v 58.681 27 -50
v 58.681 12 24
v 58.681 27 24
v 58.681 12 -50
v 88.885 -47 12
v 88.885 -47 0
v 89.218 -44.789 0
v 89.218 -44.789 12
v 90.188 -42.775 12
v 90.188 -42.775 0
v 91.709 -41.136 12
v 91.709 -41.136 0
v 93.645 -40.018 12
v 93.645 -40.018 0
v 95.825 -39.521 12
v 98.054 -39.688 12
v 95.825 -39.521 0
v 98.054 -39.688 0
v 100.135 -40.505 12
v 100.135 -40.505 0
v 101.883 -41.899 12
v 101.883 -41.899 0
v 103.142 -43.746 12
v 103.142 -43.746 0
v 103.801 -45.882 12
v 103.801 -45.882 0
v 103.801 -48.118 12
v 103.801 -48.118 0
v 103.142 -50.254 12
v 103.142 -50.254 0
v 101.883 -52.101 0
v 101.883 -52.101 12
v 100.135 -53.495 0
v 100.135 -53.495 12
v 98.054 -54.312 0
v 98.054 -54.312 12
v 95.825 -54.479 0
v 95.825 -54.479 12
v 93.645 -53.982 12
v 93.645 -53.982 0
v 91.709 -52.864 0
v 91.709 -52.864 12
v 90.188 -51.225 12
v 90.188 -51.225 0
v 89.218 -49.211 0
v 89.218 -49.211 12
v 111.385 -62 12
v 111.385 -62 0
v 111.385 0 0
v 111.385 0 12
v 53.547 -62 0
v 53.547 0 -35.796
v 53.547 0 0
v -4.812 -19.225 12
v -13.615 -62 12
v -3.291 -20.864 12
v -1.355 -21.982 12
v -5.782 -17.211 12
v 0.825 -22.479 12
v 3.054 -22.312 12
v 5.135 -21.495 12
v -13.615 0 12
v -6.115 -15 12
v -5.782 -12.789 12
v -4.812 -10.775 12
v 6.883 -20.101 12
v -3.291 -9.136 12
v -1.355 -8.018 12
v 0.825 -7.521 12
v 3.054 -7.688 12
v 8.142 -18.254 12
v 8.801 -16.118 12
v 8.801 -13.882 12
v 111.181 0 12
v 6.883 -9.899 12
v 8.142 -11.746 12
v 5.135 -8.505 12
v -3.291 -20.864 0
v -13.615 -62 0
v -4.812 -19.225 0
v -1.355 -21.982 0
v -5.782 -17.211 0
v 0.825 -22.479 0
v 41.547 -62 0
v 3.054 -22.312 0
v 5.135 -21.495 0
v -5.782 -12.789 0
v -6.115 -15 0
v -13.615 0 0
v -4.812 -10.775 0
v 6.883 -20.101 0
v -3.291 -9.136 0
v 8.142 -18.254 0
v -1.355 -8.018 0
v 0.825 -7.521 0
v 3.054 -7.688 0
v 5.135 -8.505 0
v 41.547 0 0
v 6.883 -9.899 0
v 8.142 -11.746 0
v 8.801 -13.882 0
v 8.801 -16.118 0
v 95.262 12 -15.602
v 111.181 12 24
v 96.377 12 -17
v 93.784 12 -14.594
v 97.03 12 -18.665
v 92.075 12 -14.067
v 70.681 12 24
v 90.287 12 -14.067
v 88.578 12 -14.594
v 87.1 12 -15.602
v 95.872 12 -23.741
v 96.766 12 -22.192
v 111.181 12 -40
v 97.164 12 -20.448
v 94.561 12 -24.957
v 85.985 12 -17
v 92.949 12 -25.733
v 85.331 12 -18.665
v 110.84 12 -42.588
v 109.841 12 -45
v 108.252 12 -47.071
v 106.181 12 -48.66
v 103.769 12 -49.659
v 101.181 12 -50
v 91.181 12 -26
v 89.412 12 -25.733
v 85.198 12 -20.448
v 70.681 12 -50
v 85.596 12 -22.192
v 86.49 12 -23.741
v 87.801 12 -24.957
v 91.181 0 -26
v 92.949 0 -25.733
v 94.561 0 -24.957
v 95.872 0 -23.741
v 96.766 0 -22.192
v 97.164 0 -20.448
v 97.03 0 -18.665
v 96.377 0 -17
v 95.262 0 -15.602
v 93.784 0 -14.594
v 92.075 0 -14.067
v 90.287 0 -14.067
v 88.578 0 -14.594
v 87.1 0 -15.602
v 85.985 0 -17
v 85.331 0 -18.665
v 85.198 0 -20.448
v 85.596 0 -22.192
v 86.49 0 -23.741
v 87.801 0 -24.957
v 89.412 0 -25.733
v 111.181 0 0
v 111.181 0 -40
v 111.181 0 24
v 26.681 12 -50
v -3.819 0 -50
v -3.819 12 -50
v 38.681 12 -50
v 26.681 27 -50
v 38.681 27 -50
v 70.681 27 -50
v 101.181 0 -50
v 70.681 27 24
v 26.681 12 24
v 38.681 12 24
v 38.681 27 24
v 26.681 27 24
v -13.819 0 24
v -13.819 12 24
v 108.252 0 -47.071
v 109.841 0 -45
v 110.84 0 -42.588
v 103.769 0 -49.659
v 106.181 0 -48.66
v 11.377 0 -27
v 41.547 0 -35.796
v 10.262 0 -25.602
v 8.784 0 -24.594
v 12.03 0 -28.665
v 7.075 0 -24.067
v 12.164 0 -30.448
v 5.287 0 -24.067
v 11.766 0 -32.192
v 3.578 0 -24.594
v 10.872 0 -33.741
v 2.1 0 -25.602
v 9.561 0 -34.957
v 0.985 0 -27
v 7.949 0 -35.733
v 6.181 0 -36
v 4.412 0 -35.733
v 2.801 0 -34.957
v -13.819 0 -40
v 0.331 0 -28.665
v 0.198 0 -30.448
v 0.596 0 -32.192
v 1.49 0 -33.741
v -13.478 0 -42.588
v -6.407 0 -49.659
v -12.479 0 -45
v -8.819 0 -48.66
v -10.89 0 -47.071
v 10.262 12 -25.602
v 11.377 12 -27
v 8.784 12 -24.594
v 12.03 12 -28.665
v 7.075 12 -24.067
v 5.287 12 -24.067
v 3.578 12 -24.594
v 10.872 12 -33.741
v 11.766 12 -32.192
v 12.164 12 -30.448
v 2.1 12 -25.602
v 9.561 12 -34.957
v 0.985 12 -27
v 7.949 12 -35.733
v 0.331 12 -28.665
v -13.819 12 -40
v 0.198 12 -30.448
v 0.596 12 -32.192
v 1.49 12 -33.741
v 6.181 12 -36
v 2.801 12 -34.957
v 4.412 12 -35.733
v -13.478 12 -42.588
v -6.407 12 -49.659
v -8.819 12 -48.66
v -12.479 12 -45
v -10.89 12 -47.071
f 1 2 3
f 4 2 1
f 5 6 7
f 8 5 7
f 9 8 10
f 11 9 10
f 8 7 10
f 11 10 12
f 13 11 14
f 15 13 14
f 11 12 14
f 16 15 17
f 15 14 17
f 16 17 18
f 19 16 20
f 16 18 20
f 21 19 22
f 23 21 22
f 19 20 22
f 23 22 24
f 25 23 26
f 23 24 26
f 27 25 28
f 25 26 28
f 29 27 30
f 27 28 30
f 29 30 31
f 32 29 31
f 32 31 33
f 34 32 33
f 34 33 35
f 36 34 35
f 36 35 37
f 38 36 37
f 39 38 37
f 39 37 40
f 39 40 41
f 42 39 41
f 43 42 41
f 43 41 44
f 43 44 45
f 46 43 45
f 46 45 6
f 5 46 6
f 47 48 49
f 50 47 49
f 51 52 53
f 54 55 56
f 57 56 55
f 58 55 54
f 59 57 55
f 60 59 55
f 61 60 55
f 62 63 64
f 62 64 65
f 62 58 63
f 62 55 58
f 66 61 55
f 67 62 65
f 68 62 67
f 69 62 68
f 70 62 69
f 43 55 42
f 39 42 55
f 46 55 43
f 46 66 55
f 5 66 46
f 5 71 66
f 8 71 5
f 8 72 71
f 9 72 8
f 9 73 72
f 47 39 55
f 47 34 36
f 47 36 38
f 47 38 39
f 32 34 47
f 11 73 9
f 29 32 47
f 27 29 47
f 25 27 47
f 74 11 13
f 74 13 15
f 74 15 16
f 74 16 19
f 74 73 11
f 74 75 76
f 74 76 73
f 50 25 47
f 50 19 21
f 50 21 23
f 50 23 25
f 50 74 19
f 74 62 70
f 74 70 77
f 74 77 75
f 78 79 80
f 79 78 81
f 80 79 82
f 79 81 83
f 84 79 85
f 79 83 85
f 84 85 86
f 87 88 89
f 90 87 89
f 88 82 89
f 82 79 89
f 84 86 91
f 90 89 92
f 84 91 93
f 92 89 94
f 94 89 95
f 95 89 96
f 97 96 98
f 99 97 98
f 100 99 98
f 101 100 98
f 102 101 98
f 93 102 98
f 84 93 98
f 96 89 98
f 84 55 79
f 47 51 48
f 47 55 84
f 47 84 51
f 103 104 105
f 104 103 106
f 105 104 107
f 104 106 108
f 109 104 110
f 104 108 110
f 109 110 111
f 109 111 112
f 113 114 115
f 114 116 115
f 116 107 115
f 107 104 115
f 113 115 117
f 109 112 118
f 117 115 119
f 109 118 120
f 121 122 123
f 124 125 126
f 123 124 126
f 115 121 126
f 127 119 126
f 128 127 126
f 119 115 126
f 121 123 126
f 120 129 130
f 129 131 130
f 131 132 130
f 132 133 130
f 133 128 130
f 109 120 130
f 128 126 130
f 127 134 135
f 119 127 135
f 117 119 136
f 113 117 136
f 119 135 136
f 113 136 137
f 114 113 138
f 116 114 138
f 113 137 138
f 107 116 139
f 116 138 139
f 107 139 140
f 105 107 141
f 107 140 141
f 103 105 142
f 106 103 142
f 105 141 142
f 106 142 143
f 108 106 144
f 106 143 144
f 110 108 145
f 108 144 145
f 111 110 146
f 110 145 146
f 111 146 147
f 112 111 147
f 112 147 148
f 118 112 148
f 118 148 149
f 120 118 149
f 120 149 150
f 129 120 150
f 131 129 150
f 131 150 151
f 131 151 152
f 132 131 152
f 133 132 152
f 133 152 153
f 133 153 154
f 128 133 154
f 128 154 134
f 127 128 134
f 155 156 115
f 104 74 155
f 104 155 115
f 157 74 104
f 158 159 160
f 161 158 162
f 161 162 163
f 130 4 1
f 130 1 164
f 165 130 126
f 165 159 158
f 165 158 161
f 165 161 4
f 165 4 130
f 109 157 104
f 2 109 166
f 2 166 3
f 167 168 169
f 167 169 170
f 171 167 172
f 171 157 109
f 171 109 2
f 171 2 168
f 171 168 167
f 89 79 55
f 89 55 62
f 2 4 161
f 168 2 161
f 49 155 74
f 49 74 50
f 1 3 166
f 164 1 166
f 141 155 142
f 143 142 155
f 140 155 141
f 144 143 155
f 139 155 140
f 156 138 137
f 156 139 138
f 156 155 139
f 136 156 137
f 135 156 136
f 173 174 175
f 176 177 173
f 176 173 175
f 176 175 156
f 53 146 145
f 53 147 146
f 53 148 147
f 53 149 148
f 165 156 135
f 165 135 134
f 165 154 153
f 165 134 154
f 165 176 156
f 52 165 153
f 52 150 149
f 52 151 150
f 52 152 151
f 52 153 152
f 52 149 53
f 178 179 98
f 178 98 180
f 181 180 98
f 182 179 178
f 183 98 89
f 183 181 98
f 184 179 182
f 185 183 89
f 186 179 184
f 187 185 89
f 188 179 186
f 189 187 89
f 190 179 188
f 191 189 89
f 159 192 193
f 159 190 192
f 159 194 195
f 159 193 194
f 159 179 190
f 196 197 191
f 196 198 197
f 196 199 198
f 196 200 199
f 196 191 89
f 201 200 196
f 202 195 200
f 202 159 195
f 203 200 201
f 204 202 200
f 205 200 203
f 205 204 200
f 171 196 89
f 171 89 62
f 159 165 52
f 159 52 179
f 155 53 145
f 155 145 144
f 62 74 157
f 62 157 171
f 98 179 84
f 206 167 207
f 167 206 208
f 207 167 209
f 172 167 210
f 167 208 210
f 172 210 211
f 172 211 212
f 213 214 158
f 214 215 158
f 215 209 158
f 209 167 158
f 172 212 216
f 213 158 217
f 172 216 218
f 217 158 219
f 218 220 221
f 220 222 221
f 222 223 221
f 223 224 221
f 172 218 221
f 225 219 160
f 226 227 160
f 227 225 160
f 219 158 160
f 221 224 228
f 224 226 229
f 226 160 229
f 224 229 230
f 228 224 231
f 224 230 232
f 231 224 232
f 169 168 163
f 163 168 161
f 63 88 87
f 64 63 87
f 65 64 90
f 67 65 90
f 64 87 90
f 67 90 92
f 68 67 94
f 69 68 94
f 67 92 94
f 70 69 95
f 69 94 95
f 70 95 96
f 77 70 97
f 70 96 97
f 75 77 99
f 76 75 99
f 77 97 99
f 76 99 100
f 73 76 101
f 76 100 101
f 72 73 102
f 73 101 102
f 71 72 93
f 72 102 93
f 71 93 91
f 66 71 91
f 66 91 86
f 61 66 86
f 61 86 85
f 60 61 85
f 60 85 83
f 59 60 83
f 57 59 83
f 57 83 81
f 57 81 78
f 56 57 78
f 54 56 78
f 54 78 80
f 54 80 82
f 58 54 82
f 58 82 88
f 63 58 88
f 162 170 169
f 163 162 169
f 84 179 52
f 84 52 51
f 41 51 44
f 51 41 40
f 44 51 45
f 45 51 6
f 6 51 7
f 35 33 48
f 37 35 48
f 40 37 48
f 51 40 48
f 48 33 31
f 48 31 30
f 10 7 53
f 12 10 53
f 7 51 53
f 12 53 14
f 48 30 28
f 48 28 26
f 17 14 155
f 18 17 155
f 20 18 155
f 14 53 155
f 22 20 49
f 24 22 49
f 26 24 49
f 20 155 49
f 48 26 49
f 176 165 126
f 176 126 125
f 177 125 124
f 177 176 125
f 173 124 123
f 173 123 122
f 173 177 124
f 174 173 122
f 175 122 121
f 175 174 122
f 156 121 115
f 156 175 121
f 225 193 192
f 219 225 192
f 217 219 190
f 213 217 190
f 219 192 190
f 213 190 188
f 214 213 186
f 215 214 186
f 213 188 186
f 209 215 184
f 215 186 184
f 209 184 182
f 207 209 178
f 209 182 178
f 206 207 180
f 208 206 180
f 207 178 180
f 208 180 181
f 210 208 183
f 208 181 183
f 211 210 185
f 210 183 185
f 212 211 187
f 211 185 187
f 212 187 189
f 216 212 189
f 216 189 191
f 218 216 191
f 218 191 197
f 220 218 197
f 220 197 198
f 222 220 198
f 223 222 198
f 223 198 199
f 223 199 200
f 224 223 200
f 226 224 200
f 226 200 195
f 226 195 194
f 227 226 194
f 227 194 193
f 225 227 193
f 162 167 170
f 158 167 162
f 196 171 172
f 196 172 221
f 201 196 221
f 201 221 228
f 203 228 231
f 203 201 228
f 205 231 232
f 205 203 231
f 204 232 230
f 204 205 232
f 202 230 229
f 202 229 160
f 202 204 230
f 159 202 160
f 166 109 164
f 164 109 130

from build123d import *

# Parameters (mm, degrees)
SKETCH1_W           = 125
SKETCH1_H           = 62
BOSS_EXTRUDE1_DEPTH = 12
BOSS_EXTRUDE5_DEPTH = 12
SKETCH6_R           = 7.5
CUT_EXTRUDE2_DEPTH  = 68
SKETCH8_W           = 12
SKETCH8_H           = 74
BOSS_EXTRUDE6_DEPTH = 15
SKETCH10_W          = 12
SKETCH10_H          = 50
BOSS_EXTRUDE7_DEPTH = 62
CUT_EXTRUDE3_DEPTH  = 62
SKETCH12_R          = 6
CUT_EXTRUDE4_DEPTH  = 62


with BuildPart() as part:
    # Sketch1 → Boss-Extrude1 (new body)
    with BuildSketch(Plane.XY):
        with Locations((48.885172376, -31)):
            Rectangle(SKETCH1_W, SKETCH1_H)
    extrude(amount=BOSS_EXTRUDE1_DEPTH)

    # Sketch5 → Boss-Extrude5 (add)
    with BuildSketch(Plane(origin=(0, 0, 0), x_dir=(1, 0, 0), z_dir=(0, 1, 0))):
        with BuildLine():
            Line((-3.819103259, 50), (101.180896741, 50))
            ThreePointArc((101.180896741, 50), (108.251964553, 47.071067812), (111.180896741, 40))
            Line((111.180896741, 40), (111.180896741, -24))
            Line((111.180896741, -24), (-13.819103259, -24))
            Line((-13.819103259, -24), (-13.819103259, 40))
            ThreePointArc((-13.819103259, 40), (-10.890171071, 47.071067812), (-3.819103259, 50))
        make_face()
    extrude(amount=BOSS_EXTRUDE5_DEPTH)

    # Sketch6 → Cut-Extrude2 (cut)
    with BuildSketch(Plane(origin=(0, 0, 0), x_dir=(-1, 0, 0), z_dir=(0, 0, -1))):
        with Locations((-96.385172376, -47)):
            Circle(SKETCH6_R)
        with Locations((-1.385172376, -15)):
            Circle(SKETCH6_R)
    extrude(amount=-CUT_EXTRUDE2_DEPTH, mode=Mode.SUBTRACT)

    # Sketch8 → Boss-Extrude6 (add)
    with BuildSketch(Plane(origin=(0, 12, 0), x_dir=(1, 0, 0), z_dir=(0, 1, 0))):
        with Locations((32.680896741, 13)):
            Rectangle(SKETCH8_W, SKETCH8_H)
        with Locations((64.680896741, 13)):
            Rectangle(SKETCH8_W, SKETCH8_H)
    extrude(amount=BOSS_EXTRUDE6_DEPTH)

    # Sketch10 → Boss-Extrude7 (add)
    with BuildSketch(Plane.XZ):
        with Locations((47.546562927, -25)):
            Rectangle(SKETCH10_W, SKETCH10_H)
    extrude(amount=BOSS_EXTRUDE7_DEPTH)

    # Sketch11 → Cut-Extrude3 (cut)
    with BuildSketch(Plane.ZY.offset(-41.546562927)):
        Polygon((-35.79571669, 0), (0, -62), (-50, -62), (-50, 0), align=None)
    extrude(amount=-CUT_EXTRUDE3_DEPTH, mode=Mode.SUBTRACT)

    # Sketch12 → Cut-Extrude4 (cut)
    with BuildSketch(Plane.XZ):
        with Locations(Location((6.180896741, -30, 0), (0, 0, 270))):
            Circle(SKETCH12_R)
        with Locations(Location((91.180896741, -20, 0), (0, 0, 270))):
            Circle(SKETCH12_R)
    extrude(amount=-CUT_EXTRUDE4_DEPTH, mode=Mode.SUBTRACT)


solid = part.part
